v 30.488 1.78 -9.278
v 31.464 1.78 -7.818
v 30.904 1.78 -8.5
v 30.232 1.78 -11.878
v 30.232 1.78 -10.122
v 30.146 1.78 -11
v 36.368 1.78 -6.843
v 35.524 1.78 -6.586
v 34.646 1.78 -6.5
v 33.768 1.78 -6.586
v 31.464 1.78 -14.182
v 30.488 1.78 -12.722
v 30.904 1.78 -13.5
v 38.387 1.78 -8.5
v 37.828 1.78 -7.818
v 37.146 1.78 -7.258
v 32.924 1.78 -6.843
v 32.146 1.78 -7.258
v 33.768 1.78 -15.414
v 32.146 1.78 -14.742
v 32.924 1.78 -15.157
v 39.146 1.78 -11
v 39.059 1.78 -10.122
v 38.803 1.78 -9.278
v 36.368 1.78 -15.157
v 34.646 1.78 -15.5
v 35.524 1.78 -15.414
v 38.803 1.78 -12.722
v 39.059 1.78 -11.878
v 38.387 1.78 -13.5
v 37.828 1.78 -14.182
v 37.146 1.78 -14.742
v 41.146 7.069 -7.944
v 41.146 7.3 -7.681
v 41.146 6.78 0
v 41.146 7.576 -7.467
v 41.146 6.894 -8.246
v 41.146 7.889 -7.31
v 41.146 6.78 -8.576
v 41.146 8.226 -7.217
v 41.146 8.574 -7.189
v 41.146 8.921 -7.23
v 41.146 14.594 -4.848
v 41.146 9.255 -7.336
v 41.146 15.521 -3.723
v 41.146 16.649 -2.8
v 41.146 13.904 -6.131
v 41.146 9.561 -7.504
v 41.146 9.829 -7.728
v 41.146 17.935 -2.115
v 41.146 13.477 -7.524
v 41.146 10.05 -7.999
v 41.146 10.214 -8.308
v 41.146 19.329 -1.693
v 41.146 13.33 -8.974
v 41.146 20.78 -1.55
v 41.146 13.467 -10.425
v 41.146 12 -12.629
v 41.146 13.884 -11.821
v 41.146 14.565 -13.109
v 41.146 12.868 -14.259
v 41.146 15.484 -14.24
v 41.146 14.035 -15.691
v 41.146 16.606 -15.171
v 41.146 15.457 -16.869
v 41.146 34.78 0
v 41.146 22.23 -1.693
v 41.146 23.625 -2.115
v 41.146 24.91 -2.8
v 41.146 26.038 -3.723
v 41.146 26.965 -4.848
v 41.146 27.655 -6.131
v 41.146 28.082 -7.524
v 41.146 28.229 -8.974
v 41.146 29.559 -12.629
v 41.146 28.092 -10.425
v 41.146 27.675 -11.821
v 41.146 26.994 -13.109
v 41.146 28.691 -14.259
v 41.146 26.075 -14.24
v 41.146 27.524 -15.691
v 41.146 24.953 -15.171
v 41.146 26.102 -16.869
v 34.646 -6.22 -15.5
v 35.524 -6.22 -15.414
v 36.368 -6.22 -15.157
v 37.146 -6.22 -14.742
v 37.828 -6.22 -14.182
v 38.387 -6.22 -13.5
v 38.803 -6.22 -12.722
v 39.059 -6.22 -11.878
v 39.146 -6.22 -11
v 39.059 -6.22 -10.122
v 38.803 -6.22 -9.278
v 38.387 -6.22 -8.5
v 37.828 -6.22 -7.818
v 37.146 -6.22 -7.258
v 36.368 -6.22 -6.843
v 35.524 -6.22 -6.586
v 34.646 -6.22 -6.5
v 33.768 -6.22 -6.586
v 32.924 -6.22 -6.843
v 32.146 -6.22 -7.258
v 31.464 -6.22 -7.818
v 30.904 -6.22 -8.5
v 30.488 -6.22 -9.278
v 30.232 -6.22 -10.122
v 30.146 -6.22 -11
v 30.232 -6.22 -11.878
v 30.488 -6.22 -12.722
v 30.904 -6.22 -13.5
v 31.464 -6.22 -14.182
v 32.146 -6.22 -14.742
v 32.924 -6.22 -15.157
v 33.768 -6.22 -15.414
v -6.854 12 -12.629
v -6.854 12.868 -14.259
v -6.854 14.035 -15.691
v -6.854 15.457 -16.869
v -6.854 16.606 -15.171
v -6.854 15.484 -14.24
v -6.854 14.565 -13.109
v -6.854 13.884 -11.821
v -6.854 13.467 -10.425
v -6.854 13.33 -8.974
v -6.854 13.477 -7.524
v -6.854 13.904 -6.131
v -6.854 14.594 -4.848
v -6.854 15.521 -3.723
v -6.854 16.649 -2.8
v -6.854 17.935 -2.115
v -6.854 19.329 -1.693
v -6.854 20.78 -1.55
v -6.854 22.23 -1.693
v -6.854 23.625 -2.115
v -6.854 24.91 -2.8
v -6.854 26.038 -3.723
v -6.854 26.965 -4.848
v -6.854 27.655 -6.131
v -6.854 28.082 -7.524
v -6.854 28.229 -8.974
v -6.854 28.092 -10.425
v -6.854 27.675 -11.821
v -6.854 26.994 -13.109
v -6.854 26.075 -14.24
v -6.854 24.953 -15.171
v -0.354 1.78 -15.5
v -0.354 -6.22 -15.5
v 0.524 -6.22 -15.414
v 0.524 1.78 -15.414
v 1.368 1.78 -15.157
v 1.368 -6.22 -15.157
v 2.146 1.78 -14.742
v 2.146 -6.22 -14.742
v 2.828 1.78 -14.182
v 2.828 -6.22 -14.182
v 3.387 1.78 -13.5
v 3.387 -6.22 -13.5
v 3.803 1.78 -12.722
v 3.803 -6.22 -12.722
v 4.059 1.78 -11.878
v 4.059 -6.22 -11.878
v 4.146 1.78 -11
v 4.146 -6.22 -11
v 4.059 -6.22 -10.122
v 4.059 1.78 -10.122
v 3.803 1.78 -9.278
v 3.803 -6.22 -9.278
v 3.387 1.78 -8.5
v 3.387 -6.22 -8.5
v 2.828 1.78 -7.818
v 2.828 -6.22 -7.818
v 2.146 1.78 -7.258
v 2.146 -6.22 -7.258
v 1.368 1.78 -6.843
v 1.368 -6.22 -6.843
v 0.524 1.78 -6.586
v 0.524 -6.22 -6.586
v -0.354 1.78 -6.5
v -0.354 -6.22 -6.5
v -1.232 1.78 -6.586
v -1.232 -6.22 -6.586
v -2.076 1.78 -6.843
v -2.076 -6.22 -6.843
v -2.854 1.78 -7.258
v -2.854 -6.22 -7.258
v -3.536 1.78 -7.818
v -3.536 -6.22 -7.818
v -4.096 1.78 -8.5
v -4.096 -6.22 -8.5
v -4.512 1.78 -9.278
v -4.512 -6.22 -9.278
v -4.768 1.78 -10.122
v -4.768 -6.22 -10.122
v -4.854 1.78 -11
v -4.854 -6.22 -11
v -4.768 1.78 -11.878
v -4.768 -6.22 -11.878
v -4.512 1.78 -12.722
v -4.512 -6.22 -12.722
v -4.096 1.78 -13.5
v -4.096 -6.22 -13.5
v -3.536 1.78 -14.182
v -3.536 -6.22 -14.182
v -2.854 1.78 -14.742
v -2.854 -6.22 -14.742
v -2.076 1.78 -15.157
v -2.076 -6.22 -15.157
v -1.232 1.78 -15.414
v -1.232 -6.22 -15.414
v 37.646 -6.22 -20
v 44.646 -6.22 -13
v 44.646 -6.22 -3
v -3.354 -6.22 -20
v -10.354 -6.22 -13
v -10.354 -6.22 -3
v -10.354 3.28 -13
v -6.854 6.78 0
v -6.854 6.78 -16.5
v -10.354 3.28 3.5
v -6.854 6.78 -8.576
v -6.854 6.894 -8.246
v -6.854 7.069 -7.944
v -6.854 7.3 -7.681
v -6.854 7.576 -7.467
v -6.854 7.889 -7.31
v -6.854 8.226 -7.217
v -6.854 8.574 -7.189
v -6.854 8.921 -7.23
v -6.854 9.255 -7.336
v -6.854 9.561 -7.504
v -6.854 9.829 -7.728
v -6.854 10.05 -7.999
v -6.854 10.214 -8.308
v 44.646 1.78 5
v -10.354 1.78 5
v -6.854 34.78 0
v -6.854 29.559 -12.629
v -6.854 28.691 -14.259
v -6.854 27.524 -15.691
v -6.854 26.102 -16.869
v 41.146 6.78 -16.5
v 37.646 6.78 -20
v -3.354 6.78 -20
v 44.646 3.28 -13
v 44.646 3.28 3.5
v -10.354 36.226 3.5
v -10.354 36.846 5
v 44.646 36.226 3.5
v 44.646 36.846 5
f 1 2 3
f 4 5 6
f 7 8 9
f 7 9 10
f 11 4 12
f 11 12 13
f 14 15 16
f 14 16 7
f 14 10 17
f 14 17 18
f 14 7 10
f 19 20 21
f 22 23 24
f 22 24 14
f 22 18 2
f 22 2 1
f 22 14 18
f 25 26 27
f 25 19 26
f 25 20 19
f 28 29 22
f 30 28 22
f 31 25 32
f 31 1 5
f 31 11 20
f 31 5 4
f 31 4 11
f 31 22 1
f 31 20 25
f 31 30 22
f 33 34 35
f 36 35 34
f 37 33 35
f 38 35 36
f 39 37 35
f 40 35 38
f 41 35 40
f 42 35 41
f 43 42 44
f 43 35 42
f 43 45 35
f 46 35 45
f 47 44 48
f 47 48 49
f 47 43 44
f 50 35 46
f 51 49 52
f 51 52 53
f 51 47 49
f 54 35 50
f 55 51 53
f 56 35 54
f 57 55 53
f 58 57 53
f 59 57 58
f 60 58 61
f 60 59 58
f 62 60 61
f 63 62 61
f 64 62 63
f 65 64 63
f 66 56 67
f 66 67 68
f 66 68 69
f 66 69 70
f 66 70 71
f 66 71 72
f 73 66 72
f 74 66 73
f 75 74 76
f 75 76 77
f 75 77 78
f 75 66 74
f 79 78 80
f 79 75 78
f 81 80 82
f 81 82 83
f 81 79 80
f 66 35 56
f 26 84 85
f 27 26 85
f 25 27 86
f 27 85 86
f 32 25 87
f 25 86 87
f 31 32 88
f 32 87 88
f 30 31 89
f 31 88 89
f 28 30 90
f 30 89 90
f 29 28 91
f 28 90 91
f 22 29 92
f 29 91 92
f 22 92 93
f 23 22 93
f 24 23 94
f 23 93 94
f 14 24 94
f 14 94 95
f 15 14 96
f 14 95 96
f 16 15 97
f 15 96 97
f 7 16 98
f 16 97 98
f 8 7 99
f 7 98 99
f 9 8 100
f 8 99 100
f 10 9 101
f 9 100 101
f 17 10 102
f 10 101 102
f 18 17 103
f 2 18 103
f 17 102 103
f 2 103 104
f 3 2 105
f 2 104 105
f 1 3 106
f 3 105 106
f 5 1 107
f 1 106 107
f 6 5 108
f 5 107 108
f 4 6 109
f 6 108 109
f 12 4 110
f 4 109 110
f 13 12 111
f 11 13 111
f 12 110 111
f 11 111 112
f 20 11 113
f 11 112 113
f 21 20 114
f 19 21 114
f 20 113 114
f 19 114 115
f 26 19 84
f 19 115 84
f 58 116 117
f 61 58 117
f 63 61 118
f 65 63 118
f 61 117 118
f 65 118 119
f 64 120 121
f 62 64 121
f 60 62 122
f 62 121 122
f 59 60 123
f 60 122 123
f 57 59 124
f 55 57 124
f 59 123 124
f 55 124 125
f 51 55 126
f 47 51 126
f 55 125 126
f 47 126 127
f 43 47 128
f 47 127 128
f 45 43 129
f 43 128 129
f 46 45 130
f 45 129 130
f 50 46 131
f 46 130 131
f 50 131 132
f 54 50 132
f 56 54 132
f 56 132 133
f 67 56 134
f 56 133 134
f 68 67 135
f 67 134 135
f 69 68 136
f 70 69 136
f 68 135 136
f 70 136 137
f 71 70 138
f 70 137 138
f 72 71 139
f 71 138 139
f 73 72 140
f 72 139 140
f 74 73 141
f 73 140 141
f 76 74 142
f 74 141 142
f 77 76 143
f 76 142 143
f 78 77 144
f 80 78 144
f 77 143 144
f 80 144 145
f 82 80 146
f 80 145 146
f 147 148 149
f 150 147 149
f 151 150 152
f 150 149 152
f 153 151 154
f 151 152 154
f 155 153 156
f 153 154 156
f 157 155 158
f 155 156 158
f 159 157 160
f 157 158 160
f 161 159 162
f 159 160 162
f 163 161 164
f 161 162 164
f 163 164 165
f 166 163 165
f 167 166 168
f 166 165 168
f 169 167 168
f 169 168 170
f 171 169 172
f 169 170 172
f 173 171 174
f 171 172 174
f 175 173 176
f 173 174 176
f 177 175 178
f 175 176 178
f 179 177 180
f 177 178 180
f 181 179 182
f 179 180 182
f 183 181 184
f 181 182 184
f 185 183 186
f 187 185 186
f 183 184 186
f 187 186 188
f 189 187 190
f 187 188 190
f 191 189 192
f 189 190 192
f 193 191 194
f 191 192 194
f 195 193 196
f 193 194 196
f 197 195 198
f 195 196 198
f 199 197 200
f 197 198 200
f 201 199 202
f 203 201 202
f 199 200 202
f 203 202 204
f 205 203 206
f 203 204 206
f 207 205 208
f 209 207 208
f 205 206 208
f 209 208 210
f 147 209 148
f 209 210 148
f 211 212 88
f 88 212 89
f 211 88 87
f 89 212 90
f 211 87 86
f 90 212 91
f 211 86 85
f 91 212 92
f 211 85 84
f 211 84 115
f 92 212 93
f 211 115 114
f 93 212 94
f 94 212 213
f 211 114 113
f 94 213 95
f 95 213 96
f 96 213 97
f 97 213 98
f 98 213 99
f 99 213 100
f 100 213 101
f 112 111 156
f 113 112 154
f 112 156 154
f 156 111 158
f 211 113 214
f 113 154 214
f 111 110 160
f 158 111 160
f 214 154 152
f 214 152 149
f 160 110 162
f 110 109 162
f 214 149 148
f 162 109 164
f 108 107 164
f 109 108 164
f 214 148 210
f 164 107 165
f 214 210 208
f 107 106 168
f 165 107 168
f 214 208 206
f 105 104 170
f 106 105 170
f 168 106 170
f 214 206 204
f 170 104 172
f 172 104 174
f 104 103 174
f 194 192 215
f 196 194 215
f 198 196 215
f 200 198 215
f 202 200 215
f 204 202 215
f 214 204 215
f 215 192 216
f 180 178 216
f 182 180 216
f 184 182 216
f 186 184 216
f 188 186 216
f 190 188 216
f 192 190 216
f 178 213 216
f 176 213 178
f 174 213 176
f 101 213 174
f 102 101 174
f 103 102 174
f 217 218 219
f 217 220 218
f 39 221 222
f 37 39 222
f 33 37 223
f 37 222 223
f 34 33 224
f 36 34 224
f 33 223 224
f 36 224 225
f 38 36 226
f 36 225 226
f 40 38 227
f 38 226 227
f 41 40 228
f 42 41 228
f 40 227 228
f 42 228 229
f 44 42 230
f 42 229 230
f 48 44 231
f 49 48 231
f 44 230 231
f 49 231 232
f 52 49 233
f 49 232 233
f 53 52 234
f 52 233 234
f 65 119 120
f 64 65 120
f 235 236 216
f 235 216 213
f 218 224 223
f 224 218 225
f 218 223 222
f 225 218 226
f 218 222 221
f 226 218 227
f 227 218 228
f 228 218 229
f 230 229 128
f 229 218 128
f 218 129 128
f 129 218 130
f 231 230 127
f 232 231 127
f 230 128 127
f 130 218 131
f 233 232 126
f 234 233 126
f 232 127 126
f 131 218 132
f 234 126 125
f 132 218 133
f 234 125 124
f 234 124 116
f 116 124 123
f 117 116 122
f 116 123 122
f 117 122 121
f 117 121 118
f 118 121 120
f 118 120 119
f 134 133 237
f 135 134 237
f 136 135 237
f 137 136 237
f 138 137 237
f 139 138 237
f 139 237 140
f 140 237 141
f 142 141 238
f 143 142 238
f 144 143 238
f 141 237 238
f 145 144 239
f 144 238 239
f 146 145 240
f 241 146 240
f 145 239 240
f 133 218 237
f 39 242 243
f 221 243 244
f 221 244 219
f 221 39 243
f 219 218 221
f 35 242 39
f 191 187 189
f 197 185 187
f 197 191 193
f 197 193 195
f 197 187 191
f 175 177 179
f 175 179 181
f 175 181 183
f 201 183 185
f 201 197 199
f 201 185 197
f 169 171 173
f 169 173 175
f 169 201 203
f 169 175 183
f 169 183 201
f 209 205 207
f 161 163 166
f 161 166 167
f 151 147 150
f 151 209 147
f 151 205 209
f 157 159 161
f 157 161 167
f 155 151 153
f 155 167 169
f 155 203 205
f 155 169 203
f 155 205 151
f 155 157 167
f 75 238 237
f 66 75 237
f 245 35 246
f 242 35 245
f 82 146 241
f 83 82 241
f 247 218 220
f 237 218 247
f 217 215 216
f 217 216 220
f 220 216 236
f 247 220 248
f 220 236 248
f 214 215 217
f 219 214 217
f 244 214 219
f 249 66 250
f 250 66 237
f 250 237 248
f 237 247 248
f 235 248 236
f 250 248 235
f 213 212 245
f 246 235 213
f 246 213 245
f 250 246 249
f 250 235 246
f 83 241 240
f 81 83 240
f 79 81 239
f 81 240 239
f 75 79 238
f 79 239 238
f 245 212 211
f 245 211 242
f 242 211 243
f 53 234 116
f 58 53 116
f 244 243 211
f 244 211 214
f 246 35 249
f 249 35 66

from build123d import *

# Parameters (mm, degrees)
SKETCH1_W           = 55
SKETCH1_H           = 45
BOSS_EXTRUDE1_DEPTH = 5
SKETCH3_W           = 55
SKETCH3_H           = 13
BOSS_EXTRUDE5_DEPTH = 20
CHAMFER1_SIZE       = 8
SKETCH5_R           = 4.5
CUT_EXTRUDE2_DEPTH  = 8
BOSS_EXTRUDE7_DEPTH = 48
CUT_EXTRUDE3_DEPTH  = 71.205777697
CHAMFER2_SIZE       = 3.5
CHAMFER3_SIZE       = 3.5
CHAMFER4_SIZE       = 7


with BuildPart() as part:
    # Sketch1 → Boss-Extrude1 (new body)
    with BuildSketch(Plane.XY):
        with Locations((17.145774036, 16.279520652)):
            Rectangle(SKETCH1_W, SKETCH1_H)
    extrude(amount=BOSS_EXTRUDE1_DEPTH)

    # Sketch3 → Boss-Extrude5 (add)
    with BuildSketch(Plane(origin=(0, 0, 0), x_dir=(-1, 0, 0), z_dir=(0, 0, -1))):
        with Locations((-17.145774036, 0.279520652)):
            Rectangle(SKETCH3_W, SKETCH3_H)
    extrude(amount=BOSS_EXTRUDE5_DEPTH)

    # Chamfer1
    chamfer1_edges = [part.edges().sort_by_distance(p)[0] for p in [
        (17.145774036, -6.220479348, 5),
    ]]
    chamfer(chamfer1_edges, length=CHAMFER1_SIZE)

    # Sketch5 → Cut-Extrude2 (cut)
    with BuildSketch(Plane.XZ.offset(6.220479348)):
        with Locations(Location((-0.354225964, -11, 0), (0, 0, 270))):
            Circle(SKETCH5_R)
        with Locations(Location((34.645774036, -11, 0), (0, 0, 270))):
            Circle(SKETCH5_R)
    extrude(amount=-CUT_EXTRUDE2_DEPTH, mode=Mode.SUBTRACT)

    # Sketch7 → Boss-Extrude7 (add)
    with BuildSketch(Plane.ZY.offset(6.854225964)):
        with BuildLine():
            Line((-8.308177677, 10.21387745), (-12.629175087, 12.000050953))
            ThreePointArc((-12.629175087, 12.000050953), (-15.003318067, 13.416764905), (-16.86901604, 15.457060078))
            Line((-16.86901604, 15.457060078), (-15.17096521, 16.605591044))
            ThreePointArc((-15.17096521, 16.605591044), (-1.55, 20.779520652), (-15.17096521, 24.95345026))
            Line((-15.17096521, 24.95345026), (-16.86901604, 26.101981226))
            ThreePointArc((-16.86901604, 26.101981226), (-15.003318067, 28.142276398), (-12.629175087, 29.55899035))
            Line((-12.629175087, 29.55899035), (0, 34.779520652))
            Line((0, 34.779520652), (0, 6.779520652))
            Line((0, 6.779520652), (-8.576470695, 6.779520652))
            ThreePointArc((-8.576470695, 6.779520652), (-7.194534972, 8.39922137), (-8.308177677, 10.21387745))
        make_face()
    extrude(amount=-BOSS_EXTRUDE7_DEPTH)

    # Sketch8 → Cut-Extrude3 (cut, through all)
    with BuildSketch(Plane.ZY.offset(10.354225964)):
        Polygon((0, 34.779520652), (5, 36.846373896), (5, 38.779520652), (0, 38.779520652), align=None)
    extrude(amount=-CUT_EXTRUDE3_DEPTH, mode=Mode.SUBTRACT)

    # Chamfer2
    chamfer2_edges = [part.edges().sort_by_distance(p)[0] for p in [
        (-10.354225964, 6.779520652, -10),
        (-10.354225964, 20.779520652, 0),
    ]]
    chamfer(chamfer2_edges, length=CHAMFER2_SIZE - 0.0001)  # a hair under: the kernel refuses the full size

    # Chamfer3
    chamfer3_edges = [part.edges().sort_by_distance(p)[0] for p in [
        (44.645774036, 20.779520652, 0),
        (44.645774036, 6.779520652, -10),
    ]]
    chamfer(chamfer3_edges, length=CHAMFER3_SIZE - 0.0001)  # a hair under: the kernel refuses the full size

    # Chamfer4
    chamfer4_edges = [part.edges().sort_by_distance(p)[0] for p in [
        (44.645774036, -1.470429348, -20),
        (-10.354225964, -1.470429348, -20),
    ]]
    chamfer(chamfer4_edges, length=CHAMFER4_SIZE)


solid = part.part
